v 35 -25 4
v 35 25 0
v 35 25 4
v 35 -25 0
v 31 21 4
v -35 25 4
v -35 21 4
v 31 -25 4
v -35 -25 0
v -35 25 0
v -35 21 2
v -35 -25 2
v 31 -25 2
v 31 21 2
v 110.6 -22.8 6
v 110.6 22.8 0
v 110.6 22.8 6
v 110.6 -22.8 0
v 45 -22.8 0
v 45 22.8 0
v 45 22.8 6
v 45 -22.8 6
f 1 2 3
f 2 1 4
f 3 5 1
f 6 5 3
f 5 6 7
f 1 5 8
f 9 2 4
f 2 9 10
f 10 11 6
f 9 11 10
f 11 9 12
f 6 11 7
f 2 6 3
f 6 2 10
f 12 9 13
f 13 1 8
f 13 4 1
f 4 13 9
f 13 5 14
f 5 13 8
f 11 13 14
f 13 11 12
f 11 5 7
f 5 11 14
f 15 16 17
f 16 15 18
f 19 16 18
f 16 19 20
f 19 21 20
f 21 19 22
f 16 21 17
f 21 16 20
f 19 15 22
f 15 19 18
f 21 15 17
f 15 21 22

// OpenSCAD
// Two-part enclosure for small electronics board
// Print orientation: both parts flat on bed, side by side

// ---- Parameters ----
box_x      = 70;    // box outer length (X)
box_y      = 50;    // box outer width (Y)
box_z      = 30;    // box outer height (Z)
wall       = 2;     // box wall thickness
floor      = 2;     // box floor thickness
lip_t      = 1.5;   // lid lip thickness
lip_h      = 4;     // lid lip height
lip_x      = 65.6;  // lip outer length (X)
lip_y      = 45.6;  // lip outer width (Y)
eps        = 0.5;   // cutter overshoot past faces
gap        = 10;    // gap between box and lid

$fn = 64;

// ---- Model ----
union() {
    // Box (open top)
    translate([-box_x/2, -box_y/2, 0])
        difference() {
            cube([box_x, box_y, floor + wall]);
            translate([0, 0, floor])
                cube([box_x - 2*wall, box_y - 2*wall, wall + eps]);
        }

    // Lid (printed upside down: plate on bed, lip pointing up)
    translate([box_x/2 + gap, -lip_y/2, 0])
        union() {
            // Base plate
            translate([0, 0, 0])
                cube([lip_x, lip_y, 2]);
            // Lip
            translate([0, 0, 2])
                cube([lip_x, lip_y, lip_h]);
        }
}
